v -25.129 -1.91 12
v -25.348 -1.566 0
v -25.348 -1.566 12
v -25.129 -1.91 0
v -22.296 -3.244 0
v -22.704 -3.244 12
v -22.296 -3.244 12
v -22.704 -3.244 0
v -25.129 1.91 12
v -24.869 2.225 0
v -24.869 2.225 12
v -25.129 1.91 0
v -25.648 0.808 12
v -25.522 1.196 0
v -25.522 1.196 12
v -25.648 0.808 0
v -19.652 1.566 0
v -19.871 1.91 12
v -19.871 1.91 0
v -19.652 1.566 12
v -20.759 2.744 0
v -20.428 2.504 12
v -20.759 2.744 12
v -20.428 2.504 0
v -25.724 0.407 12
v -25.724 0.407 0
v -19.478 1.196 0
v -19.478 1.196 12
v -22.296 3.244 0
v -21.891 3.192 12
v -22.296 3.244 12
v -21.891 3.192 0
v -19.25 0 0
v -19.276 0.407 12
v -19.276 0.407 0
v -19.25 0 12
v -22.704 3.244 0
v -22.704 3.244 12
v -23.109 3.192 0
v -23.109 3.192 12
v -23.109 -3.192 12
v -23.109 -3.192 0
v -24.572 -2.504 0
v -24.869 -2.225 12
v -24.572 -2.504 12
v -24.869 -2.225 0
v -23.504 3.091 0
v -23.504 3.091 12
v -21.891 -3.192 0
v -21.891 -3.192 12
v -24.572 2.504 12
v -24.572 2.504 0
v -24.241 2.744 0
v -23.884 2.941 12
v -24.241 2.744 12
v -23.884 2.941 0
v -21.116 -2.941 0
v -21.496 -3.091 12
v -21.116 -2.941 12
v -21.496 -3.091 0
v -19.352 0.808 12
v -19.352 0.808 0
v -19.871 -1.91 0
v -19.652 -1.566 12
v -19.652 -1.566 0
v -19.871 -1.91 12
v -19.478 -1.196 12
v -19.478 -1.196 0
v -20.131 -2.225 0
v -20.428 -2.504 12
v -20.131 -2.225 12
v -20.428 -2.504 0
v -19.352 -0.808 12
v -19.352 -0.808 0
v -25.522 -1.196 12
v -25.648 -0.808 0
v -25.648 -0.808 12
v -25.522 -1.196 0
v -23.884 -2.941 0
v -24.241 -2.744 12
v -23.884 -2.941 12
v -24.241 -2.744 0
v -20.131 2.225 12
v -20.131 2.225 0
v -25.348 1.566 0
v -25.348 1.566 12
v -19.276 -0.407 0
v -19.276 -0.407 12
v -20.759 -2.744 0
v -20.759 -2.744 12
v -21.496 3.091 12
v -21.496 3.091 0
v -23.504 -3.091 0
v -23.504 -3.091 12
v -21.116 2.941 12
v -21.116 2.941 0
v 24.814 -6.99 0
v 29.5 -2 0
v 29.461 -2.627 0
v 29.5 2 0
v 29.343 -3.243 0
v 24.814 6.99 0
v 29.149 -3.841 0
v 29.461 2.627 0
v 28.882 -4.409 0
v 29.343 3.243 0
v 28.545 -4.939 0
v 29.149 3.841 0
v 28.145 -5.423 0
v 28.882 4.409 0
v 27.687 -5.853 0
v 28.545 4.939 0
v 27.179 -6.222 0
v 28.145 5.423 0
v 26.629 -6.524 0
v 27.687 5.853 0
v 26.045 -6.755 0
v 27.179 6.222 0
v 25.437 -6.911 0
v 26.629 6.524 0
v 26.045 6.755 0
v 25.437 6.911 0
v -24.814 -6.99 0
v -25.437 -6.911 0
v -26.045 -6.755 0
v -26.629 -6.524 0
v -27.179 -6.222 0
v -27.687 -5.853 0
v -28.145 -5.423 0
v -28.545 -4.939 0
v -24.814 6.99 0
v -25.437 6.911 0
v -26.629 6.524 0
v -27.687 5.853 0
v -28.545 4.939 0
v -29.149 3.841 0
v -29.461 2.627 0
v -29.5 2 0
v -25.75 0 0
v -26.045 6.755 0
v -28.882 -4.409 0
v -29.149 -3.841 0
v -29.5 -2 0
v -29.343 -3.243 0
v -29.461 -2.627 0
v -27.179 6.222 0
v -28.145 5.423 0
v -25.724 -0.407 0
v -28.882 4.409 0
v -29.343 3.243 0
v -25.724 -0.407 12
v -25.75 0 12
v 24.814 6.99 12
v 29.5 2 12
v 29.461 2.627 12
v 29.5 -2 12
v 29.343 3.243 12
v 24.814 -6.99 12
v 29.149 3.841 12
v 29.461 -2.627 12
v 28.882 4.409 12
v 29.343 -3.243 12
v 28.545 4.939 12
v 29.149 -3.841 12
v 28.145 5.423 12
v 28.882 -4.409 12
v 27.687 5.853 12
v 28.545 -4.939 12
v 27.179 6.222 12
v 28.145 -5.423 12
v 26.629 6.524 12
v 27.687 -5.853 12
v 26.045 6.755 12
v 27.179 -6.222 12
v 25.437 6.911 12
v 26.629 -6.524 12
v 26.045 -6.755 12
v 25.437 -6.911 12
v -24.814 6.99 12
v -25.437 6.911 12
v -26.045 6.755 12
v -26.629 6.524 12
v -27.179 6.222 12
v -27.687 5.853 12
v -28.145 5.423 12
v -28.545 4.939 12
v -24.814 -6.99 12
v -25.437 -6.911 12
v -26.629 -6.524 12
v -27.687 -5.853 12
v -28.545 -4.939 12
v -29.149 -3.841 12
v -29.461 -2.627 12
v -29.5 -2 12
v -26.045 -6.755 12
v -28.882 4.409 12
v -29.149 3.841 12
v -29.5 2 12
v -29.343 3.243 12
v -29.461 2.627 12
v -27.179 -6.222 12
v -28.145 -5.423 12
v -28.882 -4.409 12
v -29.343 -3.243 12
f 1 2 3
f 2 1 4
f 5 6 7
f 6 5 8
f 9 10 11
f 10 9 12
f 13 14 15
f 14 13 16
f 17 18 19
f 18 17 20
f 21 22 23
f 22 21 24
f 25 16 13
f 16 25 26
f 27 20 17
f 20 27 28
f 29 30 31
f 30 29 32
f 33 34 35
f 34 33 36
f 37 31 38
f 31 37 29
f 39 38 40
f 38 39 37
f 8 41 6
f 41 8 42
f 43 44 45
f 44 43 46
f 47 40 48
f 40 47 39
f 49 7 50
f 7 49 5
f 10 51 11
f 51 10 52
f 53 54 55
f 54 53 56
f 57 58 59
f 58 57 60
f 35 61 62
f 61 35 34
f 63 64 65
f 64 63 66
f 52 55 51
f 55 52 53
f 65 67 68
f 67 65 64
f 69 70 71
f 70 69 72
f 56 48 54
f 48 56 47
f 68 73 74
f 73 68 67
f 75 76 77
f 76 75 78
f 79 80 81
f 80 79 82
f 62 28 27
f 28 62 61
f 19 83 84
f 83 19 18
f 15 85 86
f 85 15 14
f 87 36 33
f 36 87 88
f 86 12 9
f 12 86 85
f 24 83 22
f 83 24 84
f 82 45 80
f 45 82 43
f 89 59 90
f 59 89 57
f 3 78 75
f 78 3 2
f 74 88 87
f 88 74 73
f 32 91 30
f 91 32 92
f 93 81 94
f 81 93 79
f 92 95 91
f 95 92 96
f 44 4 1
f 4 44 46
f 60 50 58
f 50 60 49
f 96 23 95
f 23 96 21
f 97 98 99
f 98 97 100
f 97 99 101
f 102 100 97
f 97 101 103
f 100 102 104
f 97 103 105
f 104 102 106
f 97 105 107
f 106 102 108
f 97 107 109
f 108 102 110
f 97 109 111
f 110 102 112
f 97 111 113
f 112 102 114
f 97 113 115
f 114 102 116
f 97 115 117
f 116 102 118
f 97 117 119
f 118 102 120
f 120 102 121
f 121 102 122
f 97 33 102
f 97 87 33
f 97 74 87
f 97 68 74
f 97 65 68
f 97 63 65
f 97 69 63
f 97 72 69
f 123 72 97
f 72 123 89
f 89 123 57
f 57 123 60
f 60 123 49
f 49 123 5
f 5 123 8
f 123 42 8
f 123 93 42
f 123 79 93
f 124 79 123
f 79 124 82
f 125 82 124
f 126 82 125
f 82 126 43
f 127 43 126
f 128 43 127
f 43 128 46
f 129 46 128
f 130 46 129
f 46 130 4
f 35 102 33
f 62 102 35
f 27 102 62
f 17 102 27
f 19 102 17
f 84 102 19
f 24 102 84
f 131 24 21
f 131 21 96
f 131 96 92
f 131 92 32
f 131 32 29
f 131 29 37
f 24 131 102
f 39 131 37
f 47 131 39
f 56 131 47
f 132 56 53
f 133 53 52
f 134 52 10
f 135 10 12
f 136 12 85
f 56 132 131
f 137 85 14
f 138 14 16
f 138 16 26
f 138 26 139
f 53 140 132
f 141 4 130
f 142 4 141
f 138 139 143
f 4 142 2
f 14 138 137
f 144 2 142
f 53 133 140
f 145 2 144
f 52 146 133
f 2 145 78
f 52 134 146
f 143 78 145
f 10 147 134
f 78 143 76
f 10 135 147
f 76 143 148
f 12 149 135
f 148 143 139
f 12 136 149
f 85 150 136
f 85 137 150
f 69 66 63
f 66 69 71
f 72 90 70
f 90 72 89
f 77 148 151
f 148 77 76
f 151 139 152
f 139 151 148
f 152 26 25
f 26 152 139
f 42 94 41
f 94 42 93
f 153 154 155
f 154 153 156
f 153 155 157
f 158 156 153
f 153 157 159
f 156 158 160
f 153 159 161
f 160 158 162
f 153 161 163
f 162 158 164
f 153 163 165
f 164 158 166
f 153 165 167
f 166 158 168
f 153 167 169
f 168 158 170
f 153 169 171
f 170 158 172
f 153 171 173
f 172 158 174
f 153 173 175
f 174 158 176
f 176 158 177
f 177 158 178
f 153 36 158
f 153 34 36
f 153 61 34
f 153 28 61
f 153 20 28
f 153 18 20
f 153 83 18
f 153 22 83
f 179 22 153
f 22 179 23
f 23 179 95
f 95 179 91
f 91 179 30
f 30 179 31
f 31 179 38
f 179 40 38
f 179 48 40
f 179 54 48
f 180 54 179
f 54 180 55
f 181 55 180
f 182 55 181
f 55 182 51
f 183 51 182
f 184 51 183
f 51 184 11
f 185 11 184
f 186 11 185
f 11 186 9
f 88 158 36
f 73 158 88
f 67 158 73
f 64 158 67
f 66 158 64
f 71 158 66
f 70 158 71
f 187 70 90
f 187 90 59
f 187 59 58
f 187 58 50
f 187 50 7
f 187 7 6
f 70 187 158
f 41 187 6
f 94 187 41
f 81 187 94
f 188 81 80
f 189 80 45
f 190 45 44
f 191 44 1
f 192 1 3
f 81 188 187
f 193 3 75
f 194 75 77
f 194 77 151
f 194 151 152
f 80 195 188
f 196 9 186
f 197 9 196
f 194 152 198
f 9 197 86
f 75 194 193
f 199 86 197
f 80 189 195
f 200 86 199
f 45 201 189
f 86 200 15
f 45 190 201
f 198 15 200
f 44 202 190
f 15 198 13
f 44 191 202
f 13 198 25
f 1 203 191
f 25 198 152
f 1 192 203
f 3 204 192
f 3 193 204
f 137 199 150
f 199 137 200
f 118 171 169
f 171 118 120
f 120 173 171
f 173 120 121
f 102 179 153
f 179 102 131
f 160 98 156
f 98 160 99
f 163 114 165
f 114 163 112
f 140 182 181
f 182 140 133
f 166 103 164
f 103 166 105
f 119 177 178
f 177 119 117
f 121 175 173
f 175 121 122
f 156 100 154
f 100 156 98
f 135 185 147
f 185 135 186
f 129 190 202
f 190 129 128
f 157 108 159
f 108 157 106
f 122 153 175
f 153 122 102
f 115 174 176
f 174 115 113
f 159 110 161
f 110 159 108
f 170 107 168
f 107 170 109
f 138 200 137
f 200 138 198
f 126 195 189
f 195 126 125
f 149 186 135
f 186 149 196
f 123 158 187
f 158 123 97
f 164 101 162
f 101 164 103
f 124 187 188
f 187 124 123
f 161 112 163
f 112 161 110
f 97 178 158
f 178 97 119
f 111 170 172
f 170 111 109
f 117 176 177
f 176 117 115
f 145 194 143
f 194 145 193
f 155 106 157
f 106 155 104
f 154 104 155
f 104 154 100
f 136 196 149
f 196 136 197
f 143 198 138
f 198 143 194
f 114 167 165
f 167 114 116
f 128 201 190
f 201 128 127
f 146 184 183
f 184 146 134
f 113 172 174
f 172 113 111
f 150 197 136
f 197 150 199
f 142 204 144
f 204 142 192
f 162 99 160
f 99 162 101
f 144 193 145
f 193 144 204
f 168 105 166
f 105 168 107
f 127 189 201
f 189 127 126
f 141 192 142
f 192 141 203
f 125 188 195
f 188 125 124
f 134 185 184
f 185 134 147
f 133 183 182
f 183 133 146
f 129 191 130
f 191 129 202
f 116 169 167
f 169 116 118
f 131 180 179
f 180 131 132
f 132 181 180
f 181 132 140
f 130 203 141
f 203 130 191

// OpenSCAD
$fn = 50;


difference() {
	union() {
		hull() {
			translate(v = [-24.5000000000, 2.0000000000, 0]) {
				cylinder(h = 12, r = 5);
			}
			translate(v = [24.5000000000, 2.0000000000, 0]) {
				cylinder(h = 12, r = 5);
			}
			translate(v = [-24.5000000000, -2.0000000000, 0]) {
				cylinder(h = 12, r = 5);
			}
			translate(v = [24.5000000000, -2.0000000000, 0]) {
				cylinder(h = 12, r = 5);
			}
		}
	}
	union() {
		translate(v = [-22.5000000000, 0.0000000000, 0]) {
			cylinder(h = 12, r = 3.2500000000);
		}
		translate(v = [-22.5000000000, 0.0000000000, 0]) {
			cylinder(h = 12, r = 1.8000000000);
		}
		translate(v = [-22.5000000000, 0.0000000000, 0]) {
			cylinder(h = 12, r = 1.8000000000);
		}
		translate(v = [-22.5000000000, 0.0000000000, 0]) {
			cylinder(h = 12, r = 1.8000000000);
		}
	}
}
